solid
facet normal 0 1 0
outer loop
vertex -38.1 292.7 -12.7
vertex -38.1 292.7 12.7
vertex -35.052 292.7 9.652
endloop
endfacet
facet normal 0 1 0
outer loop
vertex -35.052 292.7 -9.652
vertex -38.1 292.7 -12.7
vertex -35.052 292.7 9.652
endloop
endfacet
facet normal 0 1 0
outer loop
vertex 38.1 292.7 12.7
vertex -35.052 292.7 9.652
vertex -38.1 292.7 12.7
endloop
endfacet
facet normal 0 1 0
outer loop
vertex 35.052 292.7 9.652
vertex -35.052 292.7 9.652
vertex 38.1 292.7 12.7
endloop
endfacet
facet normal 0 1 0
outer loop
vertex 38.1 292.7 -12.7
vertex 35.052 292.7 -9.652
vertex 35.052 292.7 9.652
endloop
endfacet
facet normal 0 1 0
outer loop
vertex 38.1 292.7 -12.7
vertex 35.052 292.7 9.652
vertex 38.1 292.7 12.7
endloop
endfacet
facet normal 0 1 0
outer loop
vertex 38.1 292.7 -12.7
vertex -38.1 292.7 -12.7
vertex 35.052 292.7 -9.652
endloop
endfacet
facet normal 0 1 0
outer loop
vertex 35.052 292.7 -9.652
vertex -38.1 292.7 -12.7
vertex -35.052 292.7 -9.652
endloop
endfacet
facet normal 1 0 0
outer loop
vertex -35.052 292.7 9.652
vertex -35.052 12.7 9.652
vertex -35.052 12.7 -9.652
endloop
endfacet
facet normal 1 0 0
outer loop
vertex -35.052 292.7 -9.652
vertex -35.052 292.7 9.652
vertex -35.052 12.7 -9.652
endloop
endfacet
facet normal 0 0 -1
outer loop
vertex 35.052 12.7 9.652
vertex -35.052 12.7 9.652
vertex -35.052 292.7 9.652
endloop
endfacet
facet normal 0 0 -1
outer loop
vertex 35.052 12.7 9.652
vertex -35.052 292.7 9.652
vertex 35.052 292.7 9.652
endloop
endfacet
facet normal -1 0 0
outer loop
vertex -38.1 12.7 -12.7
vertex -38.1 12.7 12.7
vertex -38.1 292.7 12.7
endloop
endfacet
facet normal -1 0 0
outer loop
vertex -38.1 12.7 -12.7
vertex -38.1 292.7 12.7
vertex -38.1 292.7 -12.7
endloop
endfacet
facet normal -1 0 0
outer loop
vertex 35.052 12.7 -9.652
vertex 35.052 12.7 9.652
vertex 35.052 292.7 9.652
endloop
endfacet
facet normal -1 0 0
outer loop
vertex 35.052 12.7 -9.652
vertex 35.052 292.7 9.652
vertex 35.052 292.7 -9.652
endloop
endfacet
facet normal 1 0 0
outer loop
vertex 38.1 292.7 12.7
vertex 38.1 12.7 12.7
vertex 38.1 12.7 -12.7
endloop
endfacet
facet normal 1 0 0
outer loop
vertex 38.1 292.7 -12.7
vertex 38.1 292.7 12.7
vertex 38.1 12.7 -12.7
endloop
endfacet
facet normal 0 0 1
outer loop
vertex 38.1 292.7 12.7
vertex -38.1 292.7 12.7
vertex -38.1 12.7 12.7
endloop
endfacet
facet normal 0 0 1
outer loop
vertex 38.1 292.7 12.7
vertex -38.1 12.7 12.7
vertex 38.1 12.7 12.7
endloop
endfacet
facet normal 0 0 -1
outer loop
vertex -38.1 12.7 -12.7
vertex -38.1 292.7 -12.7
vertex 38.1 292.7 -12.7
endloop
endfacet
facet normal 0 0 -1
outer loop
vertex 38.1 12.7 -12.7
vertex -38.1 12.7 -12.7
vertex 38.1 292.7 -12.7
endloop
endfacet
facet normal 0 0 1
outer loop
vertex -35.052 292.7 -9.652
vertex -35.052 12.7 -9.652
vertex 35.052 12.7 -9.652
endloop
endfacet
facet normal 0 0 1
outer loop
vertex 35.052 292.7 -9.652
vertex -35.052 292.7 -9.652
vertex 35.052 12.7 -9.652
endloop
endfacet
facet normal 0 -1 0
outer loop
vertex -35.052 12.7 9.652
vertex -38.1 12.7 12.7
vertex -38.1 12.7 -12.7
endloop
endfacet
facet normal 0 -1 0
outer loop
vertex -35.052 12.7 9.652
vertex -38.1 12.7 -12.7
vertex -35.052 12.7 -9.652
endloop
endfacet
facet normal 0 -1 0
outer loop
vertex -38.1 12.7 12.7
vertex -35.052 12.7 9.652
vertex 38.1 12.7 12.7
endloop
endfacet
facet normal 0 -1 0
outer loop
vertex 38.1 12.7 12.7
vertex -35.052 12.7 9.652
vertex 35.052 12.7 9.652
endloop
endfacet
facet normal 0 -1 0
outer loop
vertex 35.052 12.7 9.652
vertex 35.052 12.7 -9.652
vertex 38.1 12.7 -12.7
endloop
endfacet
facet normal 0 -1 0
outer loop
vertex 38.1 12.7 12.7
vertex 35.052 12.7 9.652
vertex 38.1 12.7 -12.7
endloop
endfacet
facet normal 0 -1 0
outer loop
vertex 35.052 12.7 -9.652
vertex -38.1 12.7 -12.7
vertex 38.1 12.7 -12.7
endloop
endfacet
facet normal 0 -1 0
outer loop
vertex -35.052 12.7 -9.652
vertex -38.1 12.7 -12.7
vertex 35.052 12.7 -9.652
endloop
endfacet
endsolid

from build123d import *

# Parameters (mm, degrees)
SKETCH1_W           = 76.2
SKETCH1_H           = 25.4
SKETCH1_W_2         = 70.104
SKETCH1_H_2         = 19.304
BOSS_EXTRUDE1_DEPTH = 305.4
CUT_EXTRUDE1_START  = -12.7
SKETCH3_W           = 76.2
SKETCH3_H           = 25.4
CUT_EXTRUDE1_DEPTH  = 25.4
CUT_EXTRUDE2_START  = -12.7
SKETCH4_W           = 76.2
SKETCH4_H           = 25.4
CUT_EXTRUDE2_DEPTH  = 25.4


with BuildPart() as part:
    # Sketch1 → Boss-Extrude1 (new body)
    with BuildSketch(Plane(origin=(0, 0, 0), x_dir=(1, 0, 0), z_dir=(0, 1, 0))):
        Rectangle(SKETCH1_W, SKETCH1_H)
        Rectangle(SKETCH1_W_2, SKETCH1_H_2, mode=Mode.SUBTRACT)
    extrude(amount=BOSS_EXTRUDE1_DEPTH)

    # Sketch3 → Cut-Extrude1 (cut)
    with BuildSketch(Plane.XY.offset(CUT_EXTRUDE1_START)):
        Rectangle(SKETCH3_W, SKETCH3_H)
    extrude(amount=CUT_EXTRUDE1_DEPTH, mode=Mode.SUBTRACT)

    # Sketch4 → Cut-Extrude2 (cut)
    with BuildSketch(Plane(origin=(0, 305.4, 0), x_dir=(1, 0, 0), z_dir=(0, 0, 1)).offset(CUT_EXTRUDE2_START)):
        Rectangle(SKETCH4_W, SKETCH4_H)
    extrude(amount=CUT_EXTRUDE2_DEPTH, mode=Mode.SUBTRACT)


solid = part.part
